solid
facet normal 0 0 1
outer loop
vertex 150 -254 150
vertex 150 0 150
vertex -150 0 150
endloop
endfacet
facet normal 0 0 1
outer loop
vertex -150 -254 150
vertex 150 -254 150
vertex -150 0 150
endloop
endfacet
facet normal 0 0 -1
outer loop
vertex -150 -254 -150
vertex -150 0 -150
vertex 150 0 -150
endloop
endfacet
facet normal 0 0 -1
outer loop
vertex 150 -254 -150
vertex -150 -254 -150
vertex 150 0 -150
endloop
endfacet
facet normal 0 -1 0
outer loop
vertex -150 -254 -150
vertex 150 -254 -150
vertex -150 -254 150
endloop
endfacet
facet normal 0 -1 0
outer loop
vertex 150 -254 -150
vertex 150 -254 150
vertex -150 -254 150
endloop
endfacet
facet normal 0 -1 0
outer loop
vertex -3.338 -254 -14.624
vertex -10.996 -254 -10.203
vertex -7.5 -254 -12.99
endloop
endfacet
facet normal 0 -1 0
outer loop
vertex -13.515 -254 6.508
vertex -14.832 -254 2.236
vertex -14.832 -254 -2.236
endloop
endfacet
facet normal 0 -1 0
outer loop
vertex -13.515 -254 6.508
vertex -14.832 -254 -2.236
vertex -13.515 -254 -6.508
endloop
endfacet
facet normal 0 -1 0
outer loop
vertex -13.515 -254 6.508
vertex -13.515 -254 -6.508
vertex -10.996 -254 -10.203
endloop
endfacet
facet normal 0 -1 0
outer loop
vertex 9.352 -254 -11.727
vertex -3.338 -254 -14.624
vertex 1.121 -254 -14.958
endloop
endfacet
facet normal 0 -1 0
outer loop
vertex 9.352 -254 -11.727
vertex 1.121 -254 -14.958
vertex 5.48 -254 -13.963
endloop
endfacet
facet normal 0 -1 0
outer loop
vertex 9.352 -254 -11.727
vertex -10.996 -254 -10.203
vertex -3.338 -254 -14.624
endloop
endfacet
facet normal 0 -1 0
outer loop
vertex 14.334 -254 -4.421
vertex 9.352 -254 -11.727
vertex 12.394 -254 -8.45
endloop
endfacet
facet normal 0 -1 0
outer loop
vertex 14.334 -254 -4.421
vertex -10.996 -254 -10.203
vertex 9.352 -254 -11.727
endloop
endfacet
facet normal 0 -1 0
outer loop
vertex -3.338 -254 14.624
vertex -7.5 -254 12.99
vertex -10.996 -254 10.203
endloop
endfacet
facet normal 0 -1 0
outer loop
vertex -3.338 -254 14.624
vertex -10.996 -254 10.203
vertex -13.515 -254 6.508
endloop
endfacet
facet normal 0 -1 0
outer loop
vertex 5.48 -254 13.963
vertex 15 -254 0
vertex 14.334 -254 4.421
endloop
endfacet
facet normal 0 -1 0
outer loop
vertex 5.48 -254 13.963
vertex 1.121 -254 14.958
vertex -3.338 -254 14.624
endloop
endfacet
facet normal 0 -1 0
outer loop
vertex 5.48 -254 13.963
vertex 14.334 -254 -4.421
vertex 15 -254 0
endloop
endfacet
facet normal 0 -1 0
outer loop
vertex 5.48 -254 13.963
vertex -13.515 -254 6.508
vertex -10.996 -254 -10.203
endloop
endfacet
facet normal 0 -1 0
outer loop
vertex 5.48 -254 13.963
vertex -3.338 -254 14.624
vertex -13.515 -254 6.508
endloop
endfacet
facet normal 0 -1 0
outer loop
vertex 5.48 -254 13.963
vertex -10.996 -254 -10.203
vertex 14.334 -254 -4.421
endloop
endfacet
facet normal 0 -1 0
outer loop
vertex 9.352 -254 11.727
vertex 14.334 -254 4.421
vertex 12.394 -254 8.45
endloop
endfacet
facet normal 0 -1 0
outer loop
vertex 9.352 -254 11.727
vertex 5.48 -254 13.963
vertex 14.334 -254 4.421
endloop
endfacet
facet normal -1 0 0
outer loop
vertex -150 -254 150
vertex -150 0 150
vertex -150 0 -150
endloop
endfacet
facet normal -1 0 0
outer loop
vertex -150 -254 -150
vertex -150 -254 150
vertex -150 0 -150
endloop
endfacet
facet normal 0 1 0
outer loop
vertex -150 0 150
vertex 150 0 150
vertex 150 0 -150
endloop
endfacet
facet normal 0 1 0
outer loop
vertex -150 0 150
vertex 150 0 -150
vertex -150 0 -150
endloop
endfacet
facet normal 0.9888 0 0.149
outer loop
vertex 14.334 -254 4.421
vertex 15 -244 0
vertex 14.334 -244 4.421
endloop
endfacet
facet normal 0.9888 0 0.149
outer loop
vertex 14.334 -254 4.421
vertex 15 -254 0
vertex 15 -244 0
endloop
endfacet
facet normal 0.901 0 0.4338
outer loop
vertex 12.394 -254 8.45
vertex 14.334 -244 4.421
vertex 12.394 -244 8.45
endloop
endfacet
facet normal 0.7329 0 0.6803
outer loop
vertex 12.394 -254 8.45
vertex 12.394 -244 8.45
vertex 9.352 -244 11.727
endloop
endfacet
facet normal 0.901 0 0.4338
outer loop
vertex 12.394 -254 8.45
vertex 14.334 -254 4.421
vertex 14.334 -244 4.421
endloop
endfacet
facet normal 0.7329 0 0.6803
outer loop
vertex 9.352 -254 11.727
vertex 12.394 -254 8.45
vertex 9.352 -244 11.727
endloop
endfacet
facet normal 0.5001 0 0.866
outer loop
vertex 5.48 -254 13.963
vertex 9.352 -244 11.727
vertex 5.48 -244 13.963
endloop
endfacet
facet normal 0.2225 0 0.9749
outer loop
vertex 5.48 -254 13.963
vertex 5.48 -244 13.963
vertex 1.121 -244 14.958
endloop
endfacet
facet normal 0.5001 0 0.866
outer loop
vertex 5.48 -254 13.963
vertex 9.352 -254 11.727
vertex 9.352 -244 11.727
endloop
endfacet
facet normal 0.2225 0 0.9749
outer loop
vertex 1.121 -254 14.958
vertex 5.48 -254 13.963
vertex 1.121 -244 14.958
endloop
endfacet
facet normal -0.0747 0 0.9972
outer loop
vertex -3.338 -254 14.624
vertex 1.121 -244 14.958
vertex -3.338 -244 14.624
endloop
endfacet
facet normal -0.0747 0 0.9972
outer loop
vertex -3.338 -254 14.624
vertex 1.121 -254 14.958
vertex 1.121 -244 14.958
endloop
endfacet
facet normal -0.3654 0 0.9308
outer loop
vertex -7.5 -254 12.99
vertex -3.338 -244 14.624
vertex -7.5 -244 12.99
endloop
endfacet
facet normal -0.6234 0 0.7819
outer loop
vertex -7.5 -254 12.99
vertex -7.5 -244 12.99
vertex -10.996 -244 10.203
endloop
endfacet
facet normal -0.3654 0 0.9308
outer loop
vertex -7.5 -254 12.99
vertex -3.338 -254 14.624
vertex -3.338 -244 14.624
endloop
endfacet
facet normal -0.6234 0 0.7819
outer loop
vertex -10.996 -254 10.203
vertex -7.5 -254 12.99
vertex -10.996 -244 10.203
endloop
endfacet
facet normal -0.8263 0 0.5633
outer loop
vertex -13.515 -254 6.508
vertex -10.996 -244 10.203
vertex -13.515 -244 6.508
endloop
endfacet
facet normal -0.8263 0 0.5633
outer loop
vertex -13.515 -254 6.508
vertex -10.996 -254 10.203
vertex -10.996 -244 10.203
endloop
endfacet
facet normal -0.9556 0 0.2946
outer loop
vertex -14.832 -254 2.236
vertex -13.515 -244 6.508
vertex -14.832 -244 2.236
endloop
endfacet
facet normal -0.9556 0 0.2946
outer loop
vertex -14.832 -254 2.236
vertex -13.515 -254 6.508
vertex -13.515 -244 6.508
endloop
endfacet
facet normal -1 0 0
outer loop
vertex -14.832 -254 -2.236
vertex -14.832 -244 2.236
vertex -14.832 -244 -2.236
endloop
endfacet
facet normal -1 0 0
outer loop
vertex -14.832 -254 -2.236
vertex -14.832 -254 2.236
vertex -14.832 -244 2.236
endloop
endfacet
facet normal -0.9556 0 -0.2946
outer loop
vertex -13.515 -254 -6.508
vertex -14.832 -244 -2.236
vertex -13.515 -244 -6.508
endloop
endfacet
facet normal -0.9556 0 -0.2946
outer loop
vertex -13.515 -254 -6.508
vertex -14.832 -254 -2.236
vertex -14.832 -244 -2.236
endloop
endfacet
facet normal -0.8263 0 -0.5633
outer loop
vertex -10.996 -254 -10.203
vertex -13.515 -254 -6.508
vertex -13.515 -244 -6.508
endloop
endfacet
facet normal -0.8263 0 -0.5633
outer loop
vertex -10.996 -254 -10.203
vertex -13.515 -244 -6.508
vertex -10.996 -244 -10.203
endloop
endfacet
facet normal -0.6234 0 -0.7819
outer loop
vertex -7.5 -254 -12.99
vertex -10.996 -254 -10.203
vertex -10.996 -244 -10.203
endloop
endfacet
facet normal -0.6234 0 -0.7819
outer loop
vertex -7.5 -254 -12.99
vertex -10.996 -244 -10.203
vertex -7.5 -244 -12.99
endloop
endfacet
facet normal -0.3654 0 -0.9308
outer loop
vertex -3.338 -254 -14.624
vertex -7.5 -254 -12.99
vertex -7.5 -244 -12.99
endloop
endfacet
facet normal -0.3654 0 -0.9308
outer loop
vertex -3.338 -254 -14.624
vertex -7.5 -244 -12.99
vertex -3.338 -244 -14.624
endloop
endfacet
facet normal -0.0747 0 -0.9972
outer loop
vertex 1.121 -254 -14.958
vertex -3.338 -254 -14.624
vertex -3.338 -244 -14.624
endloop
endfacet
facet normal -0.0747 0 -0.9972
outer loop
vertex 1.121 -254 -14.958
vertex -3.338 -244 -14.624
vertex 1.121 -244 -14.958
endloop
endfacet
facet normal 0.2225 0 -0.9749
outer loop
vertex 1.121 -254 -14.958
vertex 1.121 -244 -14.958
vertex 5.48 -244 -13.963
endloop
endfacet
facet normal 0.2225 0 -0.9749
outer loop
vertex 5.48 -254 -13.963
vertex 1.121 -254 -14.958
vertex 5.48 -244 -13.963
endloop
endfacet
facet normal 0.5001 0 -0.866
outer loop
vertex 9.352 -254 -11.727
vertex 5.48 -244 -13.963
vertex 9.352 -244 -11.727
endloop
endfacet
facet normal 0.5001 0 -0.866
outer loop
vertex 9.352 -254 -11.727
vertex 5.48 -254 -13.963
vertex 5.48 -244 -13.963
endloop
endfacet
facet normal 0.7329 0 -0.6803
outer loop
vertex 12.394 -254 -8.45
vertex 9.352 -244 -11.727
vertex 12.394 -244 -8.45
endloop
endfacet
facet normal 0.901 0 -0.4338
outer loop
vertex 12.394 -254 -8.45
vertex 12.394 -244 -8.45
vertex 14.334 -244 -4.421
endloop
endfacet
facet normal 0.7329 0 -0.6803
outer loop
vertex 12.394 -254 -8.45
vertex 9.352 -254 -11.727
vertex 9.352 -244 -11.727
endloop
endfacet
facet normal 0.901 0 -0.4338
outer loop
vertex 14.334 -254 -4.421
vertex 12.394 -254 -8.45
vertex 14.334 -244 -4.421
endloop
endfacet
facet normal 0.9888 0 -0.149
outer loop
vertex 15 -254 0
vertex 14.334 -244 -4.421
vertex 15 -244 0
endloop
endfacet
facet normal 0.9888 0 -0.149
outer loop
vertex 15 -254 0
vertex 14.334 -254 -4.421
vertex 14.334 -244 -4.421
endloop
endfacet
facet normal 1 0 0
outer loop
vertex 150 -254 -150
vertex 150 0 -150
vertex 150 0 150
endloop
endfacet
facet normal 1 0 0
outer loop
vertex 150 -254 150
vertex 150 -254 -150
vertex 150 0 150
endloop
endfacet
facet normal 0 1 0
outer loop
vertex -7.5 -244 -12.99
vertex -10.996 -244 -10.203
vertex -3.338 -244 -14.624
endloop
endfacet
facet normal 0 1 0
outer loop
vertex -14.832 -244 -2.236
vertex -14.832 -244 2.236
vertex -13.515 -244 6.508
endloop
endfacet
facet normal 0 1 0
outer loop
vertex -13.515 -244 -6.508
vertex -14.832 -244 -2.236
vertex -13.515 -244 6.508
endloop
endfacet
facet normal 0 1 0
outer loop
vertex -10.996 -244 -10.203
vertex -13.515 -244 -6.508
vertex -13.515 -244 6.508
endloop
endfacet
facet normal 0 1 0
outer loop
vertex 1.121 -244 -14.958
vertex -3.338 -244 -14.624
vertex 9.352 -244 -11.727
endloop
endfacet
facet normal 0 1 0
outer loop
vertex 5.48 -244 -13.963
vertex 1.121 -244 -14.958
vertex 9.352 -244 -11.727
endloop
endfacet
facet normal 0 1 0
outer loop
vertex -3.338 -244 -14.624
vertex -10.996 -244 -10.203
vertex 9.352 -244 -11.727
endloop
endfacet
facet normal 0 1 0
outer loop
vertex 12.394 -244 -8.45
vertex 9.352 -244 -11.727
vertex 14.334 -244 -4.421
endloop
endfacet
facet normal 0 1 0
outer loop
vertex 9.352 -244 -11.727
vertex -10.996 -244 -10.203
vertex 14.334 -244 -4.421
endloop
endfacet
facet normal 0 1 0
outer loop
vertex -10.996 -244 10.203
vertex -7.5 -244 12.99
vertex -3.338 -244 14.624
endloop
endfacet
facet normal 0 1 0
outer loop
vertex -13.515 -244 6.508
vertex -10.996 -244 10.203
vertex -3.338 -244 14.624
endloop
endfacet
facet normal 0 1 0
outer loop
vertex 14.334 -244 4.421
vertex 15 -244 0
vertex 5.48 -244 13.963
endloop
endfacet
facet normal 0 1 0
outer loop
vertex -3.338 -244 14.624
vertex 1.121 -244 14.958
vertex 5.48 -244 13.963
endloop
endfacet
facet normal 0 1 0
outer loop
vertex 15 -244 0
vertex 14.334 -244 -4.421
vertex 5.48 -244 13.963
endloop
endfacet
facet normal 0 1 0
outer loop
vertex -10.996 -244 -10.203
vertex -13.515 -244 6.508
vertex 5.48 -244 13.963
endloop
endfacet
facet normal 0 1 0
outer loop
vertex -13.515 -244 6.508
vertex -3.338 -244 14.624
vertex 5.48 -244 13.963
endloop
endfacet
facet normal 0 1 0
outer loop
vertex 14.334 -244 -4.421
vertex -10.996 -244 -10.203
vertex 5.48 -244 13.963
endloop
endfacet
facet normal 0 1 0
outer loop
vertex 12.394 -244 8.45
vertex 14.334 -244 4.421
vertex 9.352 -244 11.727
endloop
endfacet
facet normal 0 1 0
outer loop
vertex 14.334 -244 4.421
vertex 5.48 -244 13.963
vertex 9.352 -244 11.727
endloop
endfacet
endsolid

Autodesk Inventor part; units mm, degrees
ref_plane "YZ Plane" through (0, 0, 0) normal (1, 0, 0) x (0, 1, 0)
ref_plane "XZ Plane" through (0, 0, 0) normal (0, 1, 0) x (-1, 0, 0)
ref_plane "XY Plane" through (0, 0, 0) normal (0, 0, 1) x (1, 0, 0)
sketch "Sketch1" plane through (0, 0, 0) normal (0, 1, 0) x (-1, 0, 0)
  line L0 (150, 150) -> (150, -150)
  line L1 (150, -150) -> (-150, -150)
  line L2 (-150, -150) -> (-150, 150)
  line L3 (-150, 150) -> (150, 150)
  point P0 (0, 0)
  dimension "d5" = 150
  dimension "d6" = 150
  dimension "d7" = 300
  dimension "d8" = 300
  dimension "d9" = 300
extrude "Extrusion1" add sketch "Sketch1" against normal blind 254
sketch "Sketch2" plane through (0, -254, 0) normal (0, -1, 0) x (1, 0, 0)
  circle A0 centre (0, 0) radius 15
  dimension "d10" = 30
extrude "Extrusion2" add sketch "Sketch2" against normal blind 10 separate body
properties part number "2p3cem" material "Concrete"
